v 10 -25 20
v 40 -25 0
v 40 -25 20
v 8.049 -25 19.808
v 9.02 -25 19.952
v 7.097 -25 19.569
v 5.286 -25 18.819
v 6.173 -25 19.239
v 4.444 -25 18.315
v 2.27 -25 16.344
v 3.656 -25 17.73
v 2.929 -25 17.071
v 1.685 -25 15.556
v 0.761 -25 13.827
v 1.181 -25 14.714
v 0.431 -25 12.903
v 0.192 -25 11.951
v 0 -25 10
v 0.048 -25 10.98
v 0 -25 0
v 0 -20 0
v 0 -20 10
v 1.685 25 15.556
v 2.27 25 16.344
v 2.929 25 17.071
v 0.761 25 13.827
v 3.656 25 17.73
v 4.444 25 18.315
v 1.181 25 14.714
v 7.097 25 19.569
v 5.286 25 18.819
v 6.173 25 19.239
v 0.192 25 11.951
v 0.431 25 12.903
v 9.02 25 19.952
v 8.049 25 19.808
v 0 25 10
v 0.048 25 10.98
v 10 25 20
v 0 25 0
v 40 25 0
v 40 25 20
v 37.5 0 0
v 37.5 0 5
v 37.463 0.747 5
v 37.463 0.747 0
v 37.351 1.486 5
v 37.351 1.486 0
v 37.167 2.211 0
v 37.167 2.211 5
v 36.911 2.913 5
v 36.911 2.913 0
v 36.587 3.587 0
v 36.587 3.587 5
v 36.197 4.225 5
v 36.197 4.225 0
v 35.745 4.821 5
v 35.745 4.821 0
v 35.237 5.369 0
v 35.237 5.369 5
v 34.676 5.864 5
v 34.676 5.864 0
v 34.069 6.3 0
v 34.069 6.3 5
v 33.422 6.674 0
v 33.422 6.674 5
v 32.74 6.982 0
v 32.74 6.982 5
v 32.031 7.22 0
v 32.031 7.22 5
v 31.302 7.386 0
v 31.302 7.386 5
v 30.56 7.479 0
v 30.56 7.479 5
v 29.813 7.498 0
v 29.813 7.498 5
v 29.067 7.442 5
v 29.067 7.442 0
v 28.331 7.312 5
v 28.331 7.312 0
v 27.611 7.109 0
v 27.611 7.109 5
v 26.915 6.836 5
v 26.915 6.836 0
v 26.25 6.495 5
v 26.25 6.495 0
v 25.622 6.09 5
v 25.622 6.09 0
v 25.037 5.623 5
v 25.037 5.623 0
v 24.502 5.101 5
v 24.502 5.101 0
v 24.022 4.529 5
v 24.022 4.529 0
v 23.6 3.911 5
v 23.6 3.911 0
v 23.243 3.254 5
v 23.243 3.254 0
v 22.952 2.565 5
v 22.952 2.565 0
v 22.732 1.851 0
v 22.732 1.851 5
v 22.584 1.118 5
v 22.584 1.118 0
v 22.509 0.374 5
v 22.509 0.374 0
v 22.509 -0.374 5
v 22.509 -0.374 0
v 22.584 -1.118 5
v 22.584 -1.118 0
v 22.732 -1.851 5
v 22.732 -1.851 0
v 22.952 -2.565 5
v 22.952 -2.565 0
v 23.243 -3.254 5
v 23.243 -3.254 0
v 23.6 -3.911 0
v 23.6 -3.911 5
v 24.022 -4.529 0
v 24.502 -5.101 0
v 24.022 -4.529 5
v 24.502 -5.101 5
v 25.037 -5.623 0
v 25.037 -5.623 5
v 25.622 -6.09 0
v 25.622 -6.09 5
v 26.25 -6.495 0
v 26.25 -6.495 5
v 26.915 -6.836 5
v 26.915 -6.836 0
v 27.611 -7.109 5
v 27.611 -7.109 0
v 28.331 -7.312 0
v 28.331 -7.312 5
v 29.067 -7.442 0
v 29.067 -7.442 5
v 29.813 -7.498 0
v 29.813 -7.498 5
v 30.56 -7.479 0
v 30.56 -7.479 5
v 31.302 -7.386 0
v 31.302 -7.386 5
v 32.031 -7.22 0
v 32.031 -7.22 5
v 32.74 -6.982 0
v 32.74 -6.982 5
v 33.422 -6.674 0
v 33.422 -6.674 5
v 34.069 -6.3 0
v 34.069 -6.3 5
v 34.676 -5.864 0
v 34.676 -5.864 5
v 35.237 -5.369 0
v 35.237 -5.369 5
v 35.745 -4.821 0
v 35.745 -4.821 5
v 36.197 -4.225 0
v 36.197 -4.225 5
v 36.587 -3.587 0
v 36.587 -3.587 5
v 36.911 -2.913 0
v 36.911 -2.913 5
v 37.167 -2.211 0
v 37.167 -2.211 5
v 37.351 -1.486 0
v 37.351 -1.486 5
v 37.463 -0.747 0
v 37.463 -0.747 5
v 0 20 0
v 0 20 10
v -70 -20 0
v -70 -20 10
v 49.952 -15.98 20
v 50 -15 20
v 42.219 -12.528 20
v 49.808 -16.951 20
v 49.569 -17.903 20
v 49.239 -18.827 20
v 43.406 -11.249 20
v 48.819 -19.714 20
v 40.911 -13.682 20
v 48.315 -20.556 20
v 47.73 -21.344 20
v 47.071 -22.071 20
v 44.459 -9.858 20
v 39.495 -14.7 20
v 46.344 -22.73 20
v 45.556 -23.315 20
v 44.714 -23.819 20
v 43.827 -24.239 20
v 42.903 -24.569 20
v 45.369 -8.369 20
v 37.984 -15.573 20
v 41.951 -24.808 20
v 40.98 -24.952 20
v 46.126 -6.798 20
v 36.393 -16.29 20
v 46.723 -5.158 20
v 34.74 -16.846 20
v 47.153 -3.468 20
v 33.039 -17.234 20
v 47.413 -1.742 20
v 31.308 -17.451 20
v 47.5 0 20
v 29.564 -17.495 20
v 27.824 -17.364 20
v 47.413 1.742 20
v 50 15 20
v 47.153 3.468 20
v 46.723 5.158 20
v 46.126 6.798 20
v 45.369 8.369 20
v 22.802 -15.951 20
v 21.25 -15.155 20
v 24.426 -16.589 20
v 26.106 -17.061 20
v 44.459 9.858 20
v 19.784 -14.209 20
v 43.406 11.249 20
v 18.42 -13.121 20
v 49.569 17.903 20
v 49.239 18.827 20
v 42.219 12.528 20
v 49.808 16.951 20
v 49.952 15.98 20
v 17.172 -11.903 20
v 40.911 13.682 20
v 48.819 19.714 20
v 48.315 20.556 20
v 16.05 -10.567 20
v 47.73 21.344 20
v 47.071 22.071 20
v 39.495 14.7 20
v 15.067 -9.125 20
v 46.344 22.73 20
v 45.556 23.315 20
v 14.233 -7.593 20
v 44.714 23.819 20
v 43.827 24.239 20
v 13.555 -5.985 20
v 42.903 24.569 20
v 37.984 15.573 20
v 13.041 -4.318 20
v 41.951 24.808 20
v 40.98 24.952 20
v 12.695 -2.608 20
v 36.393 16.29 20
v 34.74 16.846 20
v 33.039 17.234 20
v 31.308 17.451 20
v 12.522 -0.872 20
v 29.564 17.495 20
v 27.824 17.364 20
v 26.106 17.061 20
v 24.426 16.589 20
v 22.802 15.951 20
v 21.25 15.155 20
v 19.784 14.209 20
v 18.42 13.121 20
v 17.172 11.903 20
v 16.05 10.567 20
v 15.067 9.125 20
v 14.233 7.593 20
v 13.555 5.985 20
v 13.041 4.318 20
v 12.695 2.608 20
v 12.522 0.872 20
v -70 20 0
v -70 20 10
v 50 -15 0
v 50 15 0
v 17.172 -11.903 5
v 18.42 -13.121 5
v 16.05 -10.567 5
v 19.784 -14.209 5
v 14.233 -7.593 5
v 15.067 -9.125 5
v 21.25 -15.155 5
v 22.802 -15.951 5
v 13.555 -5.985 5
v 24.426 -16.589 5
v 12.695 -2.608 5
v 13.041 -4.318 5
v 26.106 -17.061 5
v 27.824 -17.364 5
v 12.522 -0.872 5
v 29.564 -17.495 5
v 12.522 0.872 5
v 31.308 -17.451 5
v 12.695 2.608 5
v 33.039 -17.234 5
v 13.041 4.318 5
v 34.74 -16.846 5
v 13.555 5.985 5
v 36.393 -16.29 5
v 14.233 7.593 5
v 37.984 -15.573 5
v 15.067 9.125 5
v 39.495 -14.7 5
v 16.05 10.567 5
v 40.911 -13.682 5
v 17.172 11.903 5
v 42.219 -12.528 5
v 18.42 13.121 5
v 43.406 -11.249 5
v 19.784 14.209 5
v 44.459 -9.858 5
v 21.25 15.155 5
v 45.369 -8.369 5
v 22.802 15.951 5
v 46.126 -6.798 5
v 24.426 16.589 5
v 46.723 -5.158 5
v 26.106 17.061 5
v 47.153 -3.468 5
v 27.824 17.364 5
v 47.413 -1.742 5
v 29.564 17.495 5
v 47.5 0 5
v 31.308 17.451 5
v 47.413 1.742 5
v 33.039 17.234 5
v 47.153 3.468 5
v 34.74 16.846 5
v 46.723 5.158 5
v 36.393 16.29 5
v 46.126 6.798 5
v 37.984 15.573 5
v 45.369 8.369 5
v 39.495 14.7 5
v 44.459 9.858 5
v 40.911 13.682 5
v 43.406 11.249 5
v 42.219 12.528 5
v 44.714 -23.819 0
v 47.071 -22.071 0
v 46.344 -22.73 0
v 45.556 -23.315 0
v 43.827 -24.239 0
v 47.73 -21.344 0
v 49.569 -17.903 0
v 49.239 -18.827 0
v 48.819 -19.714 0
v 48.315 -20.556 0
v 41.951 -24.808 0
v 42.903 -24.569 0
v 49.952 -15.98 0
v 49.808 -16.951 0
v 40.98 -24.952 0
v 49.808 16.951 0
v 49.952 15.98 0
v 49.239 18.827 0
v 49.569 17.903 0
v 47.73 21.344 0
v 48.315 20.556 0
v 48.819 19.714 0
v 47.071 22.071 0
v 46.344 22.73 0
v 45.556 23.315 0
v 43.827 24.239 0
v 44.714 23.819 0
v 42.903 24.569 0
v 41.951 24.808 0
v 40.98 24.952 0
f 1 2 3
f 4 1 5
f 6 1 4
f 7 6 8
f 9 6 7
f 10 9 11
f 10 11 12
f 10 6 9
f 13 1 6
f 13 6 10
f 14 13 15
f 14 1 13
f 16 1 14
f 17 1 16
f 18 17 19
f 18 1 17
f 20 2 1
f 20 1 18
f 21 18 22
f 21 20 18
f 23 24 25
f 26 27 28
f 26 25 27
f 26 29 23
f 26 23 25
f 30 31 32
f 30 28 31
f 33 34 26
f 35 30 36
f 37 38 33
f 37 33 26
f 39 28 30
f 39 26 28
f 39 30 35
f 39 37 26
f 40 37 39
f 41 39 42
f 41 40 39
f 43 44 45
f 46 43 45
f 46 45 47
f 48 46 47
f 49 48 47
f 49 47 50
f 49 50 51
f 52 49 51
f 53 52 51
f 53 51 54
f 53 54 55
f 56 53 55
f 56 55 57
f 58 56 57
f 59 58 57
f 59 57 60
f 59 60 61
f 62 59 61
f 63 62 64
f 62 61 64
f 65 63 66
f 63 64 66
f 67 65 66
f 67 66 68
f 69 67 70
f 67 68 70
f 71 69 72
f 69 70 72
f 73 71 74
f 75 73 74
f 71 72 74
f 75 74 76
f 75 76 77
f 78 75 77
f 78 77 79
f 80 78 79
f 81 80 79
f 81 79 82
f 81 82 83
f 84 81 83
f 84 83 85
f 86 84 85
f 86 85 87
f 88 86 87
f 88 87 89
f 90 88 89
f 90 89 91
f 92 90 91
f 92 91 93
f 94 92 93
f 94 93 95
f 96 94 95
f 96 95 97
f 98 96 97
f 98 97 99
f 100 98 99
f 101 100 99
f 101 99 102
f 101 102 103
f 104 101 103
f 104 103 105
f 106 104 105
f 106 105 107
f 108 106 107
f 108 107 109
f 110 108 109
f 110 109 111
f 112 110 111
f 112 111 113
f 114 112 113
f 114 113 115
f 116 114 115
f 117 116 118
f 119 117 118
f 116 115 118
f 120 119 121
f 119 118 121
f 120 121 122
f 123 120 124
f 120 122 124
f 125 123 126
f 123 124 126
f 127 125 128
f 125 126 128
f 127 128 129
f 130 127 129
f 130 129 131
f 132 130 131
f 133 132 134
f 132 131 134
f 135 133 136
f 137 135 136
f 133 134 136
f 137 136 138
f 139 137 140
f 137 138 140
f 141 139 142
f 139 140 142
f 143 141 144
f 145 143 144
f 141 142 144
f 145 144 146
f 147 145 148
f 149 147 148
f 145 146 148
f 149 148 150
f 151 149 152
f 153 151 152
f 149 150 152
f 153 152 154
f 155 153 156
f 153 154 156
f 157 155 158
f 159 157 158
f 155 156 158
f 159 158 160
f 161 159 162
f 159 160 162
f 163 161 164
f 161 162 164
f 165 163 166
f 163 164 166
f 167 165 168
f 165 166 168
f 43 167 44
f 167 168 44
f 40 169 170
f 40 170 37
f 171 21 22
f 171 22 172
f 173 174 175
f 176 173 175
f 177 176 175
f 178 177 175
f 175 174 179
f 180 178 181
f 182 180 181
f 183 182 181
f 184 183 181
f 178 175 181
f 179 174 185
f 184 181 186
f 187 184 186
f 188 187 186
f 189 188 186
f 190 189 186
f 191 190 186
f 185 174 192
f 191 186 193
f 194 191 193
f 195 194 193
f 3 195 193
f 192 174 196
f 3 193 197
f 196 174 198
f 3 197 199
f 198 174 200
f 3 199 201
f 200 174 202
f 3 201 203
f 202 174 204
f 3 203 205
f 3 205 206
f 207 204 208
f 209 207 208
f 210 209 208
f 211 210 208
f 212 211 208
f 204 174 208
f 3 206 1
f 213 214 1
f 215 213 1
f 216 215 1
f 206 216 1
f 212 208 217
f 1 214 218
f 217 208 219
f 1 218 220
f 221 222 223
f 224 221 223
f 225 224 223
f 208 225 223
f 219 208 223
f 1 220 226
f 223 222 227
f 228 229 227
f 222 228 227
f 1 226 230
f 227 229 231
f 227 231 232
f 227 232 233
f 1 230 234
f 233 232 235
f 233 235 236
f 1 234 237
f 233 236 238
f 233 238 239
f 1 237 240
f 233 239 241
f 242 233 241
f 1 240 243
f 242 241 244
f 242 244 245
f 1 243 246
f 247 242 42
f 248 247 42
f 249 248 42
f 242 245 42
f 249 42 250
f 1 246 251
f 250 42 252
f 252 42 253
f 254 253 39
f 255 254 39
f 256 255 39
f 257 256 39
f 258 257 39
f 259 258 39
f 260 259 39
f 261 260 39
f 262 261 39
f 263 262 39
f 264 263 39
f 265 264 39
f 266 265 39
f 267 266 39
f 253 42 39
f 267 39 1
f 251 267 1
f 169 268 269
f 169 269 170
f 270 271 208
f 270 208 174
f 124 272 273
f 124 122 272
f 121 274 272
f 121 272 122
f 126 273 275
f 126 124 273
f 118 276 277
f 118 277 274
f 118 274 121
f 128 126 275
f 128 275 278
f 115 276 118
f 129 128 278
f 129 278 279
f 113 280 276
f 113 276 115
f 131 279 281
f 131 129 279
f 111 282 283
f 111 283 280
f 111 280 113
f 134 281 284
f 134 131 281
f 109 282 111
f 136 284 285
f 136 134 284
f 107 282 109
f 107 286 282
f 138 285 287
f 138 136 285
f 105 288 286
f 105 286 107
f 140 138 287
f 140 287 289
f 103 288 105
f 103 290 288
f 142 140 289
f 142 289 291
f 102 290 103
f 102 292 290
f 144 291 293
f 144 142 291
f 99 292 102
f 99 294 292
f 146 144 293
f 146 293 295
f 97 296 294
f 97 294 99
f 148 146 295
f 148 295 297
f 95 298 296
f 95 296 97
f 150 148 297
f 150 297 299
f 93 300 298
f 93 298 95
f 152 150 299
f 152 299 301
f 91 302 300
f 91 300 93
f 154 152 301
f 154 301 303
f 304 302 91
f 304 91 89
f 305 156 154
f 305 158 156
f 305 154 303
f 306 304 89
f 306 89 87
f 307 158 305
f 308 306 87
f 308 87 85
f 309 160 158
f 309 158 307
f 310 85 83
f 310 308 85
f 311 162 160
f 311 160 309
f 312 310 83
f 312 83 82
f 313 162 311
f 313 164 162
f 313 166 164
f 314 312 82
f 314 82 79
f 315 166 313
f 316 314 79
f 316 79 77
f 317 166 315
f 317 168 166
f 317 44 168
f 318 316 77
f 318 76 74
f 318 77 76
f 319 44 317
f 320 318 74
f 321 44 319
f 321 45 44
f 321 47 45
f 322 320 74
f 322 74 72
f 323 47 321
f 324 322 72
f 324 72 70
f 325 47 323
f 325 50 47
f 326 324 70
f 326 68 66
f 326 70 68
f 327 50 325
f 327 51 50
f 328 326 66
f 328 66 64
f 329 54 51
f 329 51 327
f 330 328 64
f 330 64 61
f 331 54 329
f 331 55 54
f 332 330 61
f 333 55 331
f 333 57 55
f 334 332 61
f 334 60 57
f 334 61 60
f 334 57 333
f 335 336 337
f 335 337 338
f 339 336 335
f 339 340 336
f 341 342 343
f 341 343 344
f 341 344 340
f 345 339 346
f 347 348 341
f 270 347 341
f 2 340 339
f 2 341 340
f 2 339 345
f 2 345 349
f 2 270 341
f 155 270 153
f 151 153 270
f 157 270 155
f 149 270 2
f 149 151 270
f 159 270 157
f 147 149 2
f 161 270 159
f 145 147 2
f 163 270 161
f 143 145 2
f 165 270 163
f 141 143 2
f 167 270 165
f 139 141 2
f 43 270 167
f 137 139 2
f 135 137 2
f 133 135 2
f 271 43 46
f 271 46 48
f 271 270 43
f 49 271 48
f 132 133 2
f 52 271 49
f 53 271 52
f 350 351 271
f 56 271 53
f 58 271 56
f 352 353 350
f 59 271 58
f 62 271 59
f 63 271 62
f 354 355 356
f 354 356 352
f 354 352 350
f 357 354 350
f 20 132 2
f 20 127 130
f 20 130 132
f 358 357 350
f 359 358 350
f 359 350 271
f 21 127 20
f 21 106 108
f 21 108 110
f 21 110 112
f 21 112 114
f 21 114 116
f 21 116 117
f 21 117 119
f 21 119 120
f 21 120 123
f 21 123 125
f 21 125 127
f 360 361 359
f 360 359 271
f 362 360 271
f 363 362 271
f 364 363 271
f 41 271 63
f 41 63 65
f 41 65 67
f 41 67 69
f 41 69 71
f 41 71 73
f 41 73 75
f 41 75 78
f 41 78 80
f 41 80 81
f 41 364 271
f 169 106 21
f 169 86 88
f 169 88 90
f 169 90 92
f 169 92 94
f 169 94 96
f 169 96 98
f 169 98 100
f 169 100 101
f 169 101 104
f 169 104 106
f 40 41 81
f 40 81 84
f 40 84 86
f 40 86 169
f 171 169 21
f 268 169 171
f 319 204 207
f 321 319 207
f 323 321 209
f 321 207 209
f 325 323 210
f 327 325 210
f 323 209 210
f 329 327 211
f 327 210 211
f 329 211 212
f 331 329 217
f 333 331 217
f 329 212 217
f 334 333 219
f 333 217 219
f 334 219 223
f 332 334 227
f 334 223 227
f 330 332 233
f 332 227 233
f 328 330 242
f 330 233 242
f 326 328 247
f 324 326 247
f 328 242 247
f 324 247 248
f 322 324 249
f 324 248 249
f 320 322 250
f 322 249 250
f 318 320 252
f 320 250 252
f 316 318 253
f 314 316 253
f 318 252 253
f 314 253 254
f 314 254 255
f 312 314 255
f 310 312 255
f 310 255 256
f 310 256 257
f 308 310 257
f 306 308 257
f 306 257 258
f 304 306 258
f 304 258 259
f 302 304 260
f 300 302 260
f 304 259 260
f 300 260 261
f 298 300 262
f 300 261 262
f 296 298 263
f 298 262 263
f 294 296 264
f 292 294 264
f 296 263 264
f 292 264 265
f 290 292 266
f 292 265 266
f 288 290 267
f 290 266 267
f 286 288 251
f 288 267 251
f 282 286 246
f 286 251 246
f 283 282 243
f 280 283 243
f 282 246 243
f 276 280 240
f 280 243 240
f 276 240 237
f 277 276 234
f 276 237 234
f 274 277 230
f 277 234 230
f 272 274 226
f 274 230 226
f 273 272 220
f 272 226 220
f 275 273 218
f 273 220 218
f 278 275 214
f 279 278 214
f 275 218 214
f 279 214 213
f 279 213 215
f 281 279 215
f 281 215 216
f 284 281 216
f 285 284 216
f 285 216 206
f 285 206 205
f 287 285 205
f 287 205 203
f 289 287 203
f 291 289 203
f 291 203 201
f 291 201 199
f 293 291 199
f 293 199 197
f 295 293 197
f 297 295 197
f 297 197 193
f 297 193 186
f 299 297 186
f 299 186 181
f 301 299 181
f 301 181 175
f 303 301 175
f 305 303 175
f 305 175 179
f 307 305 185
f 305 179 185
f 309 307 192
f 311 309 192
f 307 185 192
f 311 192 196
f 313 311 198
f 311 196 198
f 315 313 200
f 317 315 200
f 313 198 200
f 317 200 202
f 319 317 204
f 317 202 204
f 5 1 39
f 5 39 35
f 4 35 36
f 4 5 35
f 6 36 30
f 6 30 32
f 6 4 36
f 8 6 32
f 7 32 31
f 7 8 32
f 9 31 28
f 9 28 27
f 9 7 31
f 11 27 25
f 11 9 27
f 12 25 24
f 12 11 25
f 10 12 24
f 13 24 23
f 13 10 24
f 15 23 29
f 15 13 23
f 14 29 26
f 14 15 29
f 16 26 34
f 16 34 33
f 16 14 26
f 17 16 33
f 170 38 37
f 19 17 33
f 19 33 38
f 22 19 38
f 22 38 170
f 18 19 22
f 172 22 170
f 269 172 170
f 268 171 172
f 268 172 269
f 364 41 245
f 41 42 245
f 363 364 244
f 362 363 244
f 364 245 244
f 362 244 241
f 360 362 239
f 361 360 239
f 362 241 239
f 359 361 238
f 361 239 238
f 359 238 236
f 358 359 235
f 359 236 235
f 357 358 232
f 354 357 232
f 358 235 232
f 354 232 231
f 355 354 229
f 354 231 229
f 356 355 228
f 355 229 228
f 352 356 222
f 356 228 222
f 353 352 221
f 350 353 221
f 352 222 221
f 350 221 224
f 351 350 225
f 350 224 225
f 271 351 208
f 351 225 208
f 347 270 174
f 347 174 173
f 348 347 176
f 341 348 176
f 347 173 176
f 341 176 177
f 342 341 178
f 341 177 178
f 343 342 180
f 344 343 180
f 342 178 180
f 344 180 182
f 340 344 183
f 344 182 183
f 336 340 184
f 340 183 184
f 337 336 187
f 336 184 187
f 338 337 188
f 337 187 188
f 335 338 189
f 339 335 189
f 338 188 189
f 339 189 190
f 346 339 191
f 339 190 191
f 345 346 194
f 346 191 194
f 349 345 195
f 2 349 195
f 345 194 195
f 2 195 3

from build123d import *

# Parameters (mm, degrees)
BOSS_EXTRUDE1_DEPTH = 20
CUT_EXTRUDE1_REACH  = 78.974
SKETCH2_R           = 7.5
SKETCH3_R           = 17.5
CUT_EXTRUDE2_DEPTH  = 15
SKETCH4_W           = 10
SKETCH4_H           = 40
CUT_EXTRUDE3_DEPTH  = 70
FILLET1_R           = 10
FILLET2_START       = -26
FILLET2_DEPTH       = 52


with BuildPart() as part:
    # Sketch1 → Boss-Extrude1 (new body)
    with BuildSketch(Plane.XY):
        Polygon((-70, 20), (0, 20), (0, 25), (50, 25), (50, -25), (0, -25), (0, -20), (-70, -20), align=None)
    extrude(amount=BOSS_EXTRUDE1_DEPTH)

    # Sketch2 → Cut-Extrude1 (cut, up to next)
    with BuildSketch(Plane.XY.offset(20), mode=Mode.PRIVATE) as cut_extrude1_sk1:
        with Locations((30, 0)):
            Circle(SKETCH2_R)
    cut_extrude1_tool1 = extrude(cut_extrude1_sk1.sketch, amount=-CUT_EXTRUDE1_REACH, mode=Mode.PRIVATE) & part.part
    add(cut_extrude1_tool1.solids().sort_by_distance((30, 0, 20))[0], mode=Mode.SUBTRACT)

    # Sketch3 → Cut-Extrude2 (cut)
    with BuildSketch(Plane.XY.offset(20)):
        with Locations((30, 0)):
            Circle(SKETCH3_R)
    extrude(amount=-CUT_EXTRUDE2_DEPTH, mode=Mode.SUBTRACT)

    # Sketch4 → Cut-Extrude3 (cut)
    with BuildSketch(Plane.ZY.offset(70)):
        with Locations((15, 0)):
            Rectangle(SKETCH4_W, SKETCH4_H)
    extrude(amount=-CUT_EXTRUDE3_DEPTH, mode=Mode.SUBTRACT)

    # Fillet1
    fillet1_edges = [part.edges().sort_by_distance(p)[0] for p in [
        (50, 25, 10),
        (50, -25, 10),
    ]]
    fillet(fillet1_edges, radius=FILLET1_R)

    # Fillet2: read off the stored shape, not the designer's step
    # Fillet2 outline → Fillet2 (cut)
    with BuildSketch(Plane(origin=(0, 0, 0), x_dir=(1, 0, 0), z_dir=(0, 1, 0)).offset(FILLET2_START)):
        with BuildLine():
            ThreePointArc((10, -20), (2.928932188, -17.071067812), (0, -10))
            Line((0, -10), (0, -20))
            Line((0, -20), (10, -20))
        make_face()
    extrude(amount=FILLET2_DEPTH, mode=Mode.SUBTRACT)


solid = part.part
